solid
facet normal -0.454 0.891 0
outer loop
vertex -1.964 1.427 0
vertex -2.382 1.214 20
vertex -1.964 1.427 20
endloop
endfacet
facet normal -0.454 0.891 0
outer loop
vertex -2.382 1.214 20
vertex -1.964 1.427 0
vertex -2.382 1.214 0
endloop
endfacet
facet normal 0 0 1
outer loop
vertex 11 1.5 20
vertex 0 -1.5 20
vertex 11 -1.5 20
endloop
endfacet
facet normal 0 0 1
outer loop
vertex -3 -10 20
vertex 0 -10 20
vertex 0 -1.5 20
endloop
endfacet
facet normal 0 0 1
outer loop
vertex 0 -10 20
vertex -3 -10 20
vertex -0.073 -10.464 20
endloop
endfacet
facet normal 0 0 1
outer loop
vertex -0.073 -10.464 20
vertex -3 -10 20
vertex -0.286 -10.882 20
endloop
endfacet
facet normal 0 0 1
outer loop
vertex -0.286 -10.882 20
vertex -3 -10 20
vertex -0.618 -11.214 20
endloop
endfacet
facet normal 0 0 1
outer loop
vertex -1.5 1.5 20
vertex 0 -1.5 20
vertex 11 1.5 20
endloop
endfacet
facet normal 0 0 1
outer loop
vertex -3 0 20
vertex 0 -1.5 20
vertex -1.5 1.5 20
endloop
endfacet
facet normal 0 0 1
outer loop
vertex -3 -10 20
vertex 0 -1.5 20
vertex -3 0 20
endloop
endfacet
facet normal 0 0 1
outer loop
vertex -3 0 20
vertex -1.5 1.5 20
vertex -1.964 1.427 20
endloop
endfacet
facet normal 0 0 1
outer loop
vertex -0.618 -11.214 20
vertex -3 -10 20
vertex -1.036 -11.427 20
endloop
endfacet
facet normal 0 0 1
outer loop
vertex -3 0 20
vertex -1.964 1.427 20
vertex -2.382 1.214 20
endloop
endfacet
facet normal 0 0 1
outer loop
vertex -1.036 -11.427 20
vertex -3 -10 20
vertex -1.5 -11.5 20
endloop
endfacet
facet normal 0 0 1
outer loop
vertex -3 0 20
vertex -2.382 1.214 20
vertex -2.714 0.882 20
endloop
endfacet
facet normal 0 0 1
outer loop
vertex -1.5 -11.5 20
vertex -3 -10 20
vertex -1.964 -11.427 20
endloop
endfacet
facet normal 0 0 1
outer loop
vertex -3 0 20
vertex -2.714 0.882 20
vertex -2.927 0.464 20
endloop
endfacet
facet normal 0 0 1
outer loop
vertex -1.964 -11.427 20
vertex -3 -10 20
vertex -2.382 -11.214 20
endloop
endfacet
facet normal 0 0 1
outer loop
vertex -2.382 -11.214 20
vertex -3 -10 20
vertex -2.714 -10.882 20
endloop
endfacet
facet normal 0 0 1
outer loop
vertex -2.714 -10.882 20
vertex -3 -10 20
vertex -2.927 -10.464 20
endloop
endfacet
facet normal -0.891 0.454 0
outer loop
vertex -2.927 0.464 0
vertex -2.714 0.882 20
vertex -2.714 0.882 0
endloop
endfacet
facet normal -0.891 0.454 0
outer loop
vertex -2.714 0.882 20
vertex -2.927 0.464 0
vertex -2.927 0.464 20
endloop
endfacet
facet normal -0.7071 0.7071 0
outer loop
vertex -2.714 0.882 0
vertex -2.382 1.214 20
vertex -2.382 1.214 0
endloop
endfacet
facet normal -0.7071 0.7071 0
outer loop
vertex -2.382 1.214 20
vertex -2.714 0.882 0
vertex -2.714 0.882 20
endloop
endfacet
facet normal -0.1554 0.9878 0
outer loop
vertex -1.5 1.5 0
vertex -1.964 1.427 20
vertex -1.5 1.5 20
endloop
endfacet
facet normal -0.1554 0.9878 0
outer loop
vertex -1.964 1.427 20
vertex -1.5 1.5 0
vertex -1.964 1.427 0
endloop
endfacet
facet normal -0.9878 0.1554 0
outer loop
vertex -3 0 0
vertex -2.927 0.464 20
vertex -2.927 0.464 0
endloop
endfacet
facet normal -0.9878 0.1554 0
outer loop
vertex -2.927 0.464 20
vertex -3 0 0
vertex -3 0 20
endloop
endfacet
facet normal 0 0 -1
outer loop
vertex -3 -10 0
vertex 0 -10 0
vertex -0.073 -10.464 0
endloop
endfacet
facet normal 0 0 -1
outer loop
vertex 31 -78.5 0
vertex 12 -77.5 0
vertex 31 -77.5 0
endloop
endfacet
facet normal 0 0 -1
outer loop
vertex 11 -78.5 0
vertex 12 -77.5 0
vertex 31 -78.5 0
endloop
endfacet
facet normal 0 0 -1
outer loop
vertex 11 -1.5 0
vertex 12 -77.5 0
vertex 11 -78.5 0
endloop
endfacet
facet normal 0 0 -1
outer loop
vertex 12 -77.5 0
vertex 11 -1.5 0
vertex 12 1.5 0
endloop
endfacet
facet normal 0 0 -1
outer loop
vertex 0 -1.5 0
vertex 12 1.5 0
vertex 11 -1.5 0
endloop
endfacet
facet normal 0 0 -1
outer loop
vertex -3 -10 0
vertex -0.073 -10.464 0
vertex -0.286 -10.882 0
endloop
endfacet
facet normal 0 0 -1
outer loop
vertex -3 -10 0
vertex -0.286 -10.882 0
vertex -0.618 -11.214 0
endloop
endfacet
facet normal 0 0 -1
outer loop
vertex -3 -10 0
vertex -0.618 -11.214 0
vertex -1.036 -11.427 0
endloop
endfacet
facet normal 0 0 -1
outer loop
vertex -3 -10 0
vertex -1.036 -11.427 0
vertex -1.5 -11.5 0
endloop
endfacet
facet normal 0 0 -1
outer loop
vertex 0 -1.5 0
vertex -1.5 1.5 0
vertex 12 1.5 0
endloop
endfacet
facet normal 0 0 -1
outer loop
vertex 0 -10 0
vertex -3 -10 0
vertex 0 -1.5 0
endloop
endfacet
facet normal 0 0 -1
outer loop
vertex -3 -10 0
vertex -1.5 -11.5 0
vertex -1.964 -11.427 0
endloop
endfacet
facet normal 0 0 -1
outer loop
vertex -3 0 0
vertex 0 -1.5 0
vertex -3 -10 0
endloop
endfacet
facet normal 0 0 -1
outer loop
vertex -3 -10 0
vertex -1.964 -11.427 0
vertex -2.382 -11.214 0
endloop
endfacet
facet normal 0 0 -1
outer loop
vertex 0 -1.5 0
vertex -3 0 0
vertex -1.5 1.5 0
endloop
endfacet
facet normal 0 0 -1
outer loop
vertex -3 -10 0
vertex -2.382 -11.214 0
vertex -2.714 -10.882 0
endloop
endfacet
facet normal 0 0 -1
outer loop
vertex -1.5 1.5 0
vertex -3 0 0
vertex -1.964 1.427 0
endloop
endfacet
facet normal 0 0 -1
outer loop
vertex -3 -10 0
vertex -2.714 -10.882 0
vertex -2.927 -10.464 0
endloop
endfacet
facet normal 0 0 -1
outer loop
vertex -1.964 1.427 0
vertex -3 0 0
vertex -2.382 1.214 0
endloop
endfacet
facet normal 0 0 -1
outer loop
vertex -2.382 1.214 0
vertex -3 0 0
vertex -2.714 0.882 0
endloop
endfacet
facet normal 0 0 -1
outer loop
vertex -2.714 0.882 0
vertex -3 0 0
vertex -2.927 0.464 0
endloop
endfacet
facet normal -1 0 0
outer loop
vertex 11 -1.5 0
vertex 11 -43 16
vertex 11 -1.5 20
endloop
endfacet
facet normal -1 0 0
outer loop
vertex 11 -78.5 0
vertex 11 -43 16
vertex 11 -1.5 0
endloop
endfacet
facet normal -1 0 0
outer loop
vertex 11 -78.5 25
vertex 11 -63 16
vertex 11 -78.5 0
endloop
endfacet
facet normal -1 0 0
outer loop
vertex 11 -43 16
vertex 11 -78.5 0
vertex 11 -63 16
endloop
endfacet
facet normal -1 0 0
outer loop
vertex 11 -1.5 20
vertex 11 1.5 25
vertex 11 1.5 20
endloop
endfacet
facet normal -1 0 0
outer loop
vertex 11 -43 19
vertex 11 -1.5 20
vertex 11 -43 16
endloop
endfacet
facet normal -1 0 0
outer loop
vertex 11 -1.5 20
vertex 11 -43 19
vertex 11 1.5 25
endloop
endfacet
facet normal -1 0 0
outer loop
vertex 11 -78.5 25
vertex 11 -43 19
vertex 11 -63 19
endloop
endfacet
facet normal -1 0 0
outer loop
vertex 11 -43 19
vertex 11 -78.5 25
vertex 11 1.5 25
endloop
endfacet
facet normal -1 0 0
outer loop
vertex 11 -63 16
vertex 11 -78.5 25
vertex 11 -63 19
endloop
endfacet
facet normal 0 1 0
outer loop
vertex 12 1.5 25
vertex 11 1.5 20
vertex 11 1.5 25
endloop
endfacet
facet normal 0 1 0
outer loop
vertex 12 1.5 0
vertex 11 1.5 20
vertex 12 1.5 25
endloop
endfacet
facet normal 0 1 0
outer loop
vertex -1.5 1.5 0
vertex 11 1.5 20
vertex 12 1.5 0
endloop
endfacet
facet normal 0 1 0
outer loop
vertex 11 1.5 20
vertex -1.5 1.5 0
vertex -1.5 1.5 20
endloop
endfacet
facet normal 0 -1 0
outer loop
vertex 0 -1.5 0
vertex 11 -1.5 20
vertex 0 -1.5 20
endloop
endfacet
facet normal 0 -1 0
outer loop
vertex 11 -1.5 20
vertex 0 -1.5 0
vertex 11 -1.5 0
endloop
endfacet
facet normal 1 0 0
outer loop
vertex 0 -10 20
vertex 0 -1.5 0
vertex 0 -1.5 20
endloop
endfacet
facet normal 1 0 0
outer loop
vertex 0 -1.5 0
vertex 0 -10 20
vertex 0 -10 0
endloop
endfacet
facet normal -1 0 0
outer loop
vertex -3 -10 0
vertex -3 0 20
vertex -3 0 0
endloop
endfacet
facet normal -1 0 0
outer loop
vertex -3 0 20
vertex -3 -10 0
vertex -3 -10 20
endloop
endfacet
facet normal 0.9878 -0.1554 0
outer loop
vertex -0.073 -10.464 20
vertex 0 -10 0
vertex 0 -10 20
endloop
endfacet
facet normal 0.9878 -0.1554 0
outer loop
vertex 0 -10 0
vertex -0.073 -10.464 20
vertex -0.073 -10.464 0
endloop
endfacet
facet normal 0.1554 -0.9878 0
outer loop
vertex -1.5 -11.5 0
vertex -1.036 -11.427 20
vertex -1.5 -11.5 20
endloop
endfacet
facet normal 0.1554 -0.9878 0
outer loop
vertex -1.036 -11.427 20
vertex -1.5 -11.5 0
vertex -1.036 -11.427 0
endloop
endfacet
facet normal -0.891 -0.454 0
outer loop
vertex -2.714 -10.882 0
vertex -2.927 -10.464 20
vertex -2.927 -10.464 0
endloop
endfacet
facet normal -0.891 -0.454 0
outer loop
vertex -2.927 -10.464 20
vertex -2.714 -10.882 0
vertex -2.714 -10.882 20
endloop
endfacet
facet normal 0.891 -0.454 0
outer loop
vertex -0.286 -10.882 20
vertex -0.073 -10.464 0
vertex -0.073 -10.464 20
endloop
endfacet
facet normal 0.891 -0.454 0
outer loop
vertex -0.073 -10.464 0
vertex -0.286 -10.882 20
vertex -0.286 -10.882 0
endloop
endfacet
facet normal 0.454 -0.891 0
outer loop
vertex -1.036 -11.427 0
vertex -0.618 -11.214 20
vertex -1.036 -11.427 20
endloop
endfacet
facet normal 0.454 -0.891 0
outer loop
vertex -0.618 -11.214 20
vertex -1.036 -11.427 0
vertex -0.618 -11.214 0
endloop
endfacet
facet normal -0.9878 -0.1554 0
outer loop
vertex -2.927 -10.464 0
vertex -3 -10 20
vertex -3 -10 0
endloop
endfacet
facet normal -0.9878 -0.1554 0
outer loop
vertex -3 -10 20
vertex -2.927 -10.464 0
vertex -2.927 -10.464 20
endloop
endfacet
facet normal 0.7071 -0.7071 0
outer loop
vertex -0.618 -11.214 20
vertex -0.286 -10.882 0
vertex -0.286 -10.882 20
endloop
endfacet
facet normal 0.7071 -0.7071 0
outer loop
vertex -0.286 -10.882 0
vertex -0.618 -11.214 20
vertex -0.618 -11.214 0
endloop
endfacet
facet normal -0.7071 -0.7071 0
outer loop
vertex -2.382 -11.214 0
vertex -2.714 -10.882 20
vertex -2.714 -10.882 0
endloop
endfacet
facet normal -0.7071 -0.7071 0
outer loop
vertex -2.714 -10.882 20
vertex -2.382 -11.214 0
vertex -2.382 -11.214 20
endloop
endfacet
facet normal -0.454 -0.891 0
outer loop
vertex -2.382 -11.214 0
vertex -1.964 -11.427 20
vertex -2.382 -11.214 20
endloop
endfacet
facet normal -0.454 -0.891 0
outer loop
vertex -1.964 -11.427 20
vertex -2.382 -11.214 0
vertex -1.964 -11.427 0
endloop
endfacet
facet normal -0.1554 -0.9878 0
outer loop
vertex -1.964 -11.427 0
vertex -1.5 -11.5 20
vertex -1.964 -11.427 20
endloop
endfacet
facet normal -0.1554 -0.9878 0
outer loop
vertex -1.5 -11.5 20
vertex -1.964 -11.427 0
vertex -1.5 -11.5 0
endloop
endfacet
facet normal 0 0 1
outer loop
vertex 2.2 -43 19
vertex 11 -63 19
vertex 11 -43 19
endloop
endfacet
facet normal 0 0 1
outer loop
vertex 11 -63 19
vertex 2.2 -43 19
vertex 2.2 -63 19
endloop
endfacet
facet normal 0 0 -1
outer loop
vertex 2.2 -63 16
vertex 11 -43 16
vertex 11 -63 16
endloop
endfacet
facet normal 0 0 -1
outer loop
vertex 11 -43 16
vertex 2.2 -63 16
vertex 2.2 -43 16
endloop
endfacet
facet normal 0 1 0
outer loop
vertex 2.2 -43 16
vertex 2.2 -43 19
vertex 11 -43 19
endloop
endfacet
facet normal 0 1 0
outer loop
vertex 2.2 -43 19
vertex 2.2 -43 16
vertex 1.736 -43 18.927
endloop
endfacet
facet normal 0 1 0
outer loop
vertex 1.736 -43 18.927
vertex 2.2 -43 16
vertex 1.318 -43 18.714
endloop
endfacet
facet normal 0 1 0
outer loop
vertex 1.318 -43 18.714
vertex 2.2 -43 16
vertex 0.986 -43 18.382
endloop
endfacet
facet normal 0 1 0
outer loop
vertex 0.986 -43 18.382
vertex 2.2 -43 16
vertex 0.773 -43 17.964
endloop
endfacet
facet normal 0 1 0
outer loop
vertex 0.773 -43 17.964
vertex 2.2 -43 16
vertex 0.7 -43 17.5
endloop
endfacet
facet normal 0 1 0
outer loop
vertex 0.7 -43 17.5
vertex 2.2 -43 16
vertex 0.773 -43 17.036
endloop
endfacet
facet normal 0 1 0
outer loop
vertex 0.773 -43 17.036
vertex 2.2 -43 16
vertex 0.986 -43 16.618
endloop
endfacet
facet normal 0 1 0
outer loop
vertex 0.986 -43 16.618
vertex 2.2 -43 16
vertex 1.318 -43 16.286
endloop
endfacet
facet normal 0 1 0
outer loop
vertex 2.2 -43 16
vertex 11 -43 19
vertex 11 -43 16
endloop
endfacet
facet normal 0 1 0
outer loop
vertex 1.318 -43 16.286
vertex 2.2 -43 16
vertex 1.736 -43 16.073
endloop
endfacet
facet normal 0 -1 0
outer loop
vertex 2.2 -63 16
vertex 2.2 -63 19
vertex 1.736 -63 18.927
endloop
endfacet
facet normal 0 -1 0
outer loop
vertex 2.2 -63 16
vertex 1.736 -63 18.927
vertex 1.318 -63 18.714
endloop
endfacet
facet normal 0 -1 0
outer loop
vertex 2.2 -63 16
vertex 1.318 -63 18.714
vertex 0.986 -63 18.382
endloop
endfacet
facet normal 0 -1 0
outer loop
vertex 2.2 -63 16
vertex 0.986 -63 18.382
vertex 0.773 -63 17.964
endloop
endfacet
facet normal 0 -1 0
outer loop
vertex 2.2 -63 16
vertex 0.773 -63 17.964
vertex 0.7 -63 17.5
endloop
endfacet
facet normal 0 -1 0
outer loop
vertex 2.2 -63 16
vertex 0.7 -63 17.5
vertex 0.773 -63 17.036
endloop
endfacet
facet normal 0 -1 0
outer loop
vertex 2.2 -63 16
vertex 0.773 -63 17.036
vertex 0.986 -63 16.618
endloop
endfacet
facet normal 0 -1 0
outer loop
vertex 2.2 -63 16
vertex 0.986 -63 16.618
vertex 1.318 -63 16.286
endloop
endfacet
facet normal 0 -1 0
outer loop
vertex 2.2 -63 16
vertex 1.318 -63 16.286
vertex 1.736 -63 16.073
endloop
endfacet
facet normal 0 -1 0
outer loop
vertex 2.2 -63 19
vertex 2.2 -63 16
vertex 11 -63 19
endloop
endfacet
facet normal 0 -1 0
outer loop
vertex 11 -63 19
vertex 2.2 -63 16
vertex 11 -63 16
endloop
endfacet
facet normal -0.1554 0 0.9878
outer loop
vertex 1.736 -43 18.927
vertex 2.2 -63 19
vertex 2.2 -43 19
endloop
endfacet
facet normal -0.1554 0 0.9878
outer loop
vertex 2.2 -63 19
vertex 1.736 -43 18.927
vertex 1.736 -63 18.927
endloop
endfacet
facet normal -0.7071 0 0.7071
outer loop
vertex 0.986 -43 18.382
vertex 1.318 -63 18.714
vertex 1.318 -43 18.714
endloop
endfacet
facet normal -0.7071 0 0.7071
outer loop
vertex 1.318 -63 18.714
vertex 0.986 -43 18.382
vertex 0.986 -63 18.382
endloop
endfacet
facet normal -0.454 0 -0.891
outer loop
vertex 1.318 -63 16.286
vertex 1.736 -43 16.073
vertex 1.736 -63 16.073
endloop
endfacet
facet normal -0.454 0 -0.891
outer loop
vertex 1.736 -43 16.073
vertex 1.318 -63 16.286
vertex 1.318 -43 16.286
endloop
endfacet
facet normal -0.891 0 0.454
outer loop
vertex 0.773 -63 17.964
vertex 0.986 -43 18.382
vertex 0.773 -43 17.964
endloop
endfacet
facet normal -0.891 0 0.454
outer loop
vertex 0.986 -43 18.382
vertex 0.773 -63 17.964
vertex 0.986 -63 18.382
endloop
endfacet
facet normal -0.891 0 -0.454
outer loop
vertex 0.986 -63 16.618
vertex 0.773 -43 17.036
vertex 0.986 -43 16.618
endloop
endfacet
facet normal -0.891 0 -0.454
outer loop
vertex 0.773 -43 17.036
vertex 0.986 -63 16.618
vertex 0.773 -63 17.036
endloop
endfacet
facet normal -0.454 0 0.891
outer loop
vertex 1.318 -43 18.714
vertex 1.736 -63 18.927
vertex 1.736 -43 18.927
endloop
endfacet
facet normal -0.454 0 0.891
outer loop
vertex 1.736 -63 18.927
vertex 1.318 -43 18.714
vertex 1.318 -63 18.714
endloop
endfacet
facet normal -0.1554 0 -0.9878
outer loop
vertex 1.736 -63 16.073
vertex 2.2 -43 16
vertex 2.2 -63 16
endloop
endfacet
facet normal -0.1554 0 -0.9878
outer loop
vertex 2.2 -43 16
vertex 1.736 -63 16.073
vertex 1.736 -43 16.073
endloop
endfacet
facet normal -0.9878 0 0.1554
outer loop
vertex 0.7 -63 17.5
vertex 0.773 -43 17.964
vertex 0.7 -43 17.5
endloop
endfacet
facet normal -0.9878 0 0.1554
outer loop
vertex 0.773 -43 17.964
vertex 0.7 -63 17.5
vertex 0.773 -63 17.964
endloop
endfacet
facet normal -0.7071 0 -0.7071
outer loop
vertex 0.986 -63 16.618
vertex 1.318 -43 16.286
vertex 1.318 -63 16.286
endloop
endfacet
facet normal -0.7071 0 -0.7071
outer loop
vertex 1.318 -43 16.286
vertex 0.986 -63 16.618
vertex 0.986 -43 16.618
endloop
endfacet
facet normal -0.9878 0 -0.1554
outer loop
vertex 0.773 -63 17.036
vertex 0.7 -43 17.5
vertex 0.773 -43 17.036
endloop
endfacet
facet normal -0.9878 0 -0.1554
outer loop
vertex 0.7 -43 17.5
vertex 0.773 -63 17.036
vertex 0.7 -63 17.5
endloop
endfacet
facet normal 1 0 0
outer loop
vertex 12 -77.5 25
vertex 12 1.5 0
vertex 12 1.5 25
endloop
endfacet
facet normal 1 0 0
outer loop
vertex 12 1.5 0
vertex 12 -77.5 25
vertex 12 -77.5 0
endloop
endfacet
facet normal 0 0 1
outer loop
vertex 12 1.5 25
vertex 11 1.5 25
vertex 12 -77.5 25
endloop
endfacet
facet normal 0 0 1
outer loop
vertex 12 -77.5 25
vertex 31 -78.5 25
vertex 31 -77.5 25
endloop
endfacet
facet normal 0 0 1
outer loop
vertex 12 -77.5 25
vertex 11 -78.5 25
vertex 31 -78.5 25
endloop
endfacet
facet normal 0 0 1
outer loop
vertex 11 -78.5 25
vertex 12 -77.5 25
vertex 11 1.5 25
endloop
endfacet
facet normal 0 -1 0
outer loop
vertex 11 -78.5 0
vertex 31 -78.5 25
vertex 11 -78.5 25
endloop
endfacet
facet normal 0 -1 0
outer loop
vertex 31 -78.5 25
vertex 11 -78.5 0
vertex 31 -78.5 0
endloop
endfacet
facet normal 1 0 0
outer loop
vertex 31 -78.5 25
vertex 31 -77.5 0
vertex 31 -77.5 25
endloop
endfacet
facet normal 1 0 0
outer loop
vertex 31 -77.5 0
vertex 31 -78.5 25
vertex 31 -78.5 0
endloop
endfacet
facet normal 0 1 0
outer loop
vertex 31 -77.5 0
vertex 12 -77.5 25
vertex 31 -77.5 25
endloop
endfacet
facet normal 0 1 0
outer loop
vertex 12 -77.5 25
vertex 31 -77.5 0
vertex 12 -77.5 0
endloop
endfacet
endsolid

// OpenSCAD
module top(w, t, s) {

    d=10; // down
    g=11; // gap
    g2=-1-t; // front gap
    g3=10; // top next gap

    g4=g*.8; // gap of front

    translate([-t/2,0,0])
    cylinder(h=w, d=t, $fn=20);
    
    translate([-t/2,-t/2,0])
    cube([t/2 + g, t, w]);
  
    translate([-t, -d, 0])
    cube([t, d, w]);
    
    translate([-t/2,-d,0])
    cylinder(h=w, d=t, $fn=20);

    
    translate([g-g4,-t-w-g3-s,w+g2])
    cube([g4,w,t]);

    translate([g-g4,-t-g3-s, w+g2+t/2])
    rotate([90,0,0])
    cylinder(h=w, d=t, $fn=20);
}

w=20;
t=3;
g=11;

top(w=w, t=t, s=30);


translate([g,-80+t/2,0])
cube([1,80,22+t]);

translate([g,-80+t/2,0])
cube([20,1,22+t]);

%
color("#ffff0022")
translate([0,-100-t*1.5,0])
cube([10,100,w]);
